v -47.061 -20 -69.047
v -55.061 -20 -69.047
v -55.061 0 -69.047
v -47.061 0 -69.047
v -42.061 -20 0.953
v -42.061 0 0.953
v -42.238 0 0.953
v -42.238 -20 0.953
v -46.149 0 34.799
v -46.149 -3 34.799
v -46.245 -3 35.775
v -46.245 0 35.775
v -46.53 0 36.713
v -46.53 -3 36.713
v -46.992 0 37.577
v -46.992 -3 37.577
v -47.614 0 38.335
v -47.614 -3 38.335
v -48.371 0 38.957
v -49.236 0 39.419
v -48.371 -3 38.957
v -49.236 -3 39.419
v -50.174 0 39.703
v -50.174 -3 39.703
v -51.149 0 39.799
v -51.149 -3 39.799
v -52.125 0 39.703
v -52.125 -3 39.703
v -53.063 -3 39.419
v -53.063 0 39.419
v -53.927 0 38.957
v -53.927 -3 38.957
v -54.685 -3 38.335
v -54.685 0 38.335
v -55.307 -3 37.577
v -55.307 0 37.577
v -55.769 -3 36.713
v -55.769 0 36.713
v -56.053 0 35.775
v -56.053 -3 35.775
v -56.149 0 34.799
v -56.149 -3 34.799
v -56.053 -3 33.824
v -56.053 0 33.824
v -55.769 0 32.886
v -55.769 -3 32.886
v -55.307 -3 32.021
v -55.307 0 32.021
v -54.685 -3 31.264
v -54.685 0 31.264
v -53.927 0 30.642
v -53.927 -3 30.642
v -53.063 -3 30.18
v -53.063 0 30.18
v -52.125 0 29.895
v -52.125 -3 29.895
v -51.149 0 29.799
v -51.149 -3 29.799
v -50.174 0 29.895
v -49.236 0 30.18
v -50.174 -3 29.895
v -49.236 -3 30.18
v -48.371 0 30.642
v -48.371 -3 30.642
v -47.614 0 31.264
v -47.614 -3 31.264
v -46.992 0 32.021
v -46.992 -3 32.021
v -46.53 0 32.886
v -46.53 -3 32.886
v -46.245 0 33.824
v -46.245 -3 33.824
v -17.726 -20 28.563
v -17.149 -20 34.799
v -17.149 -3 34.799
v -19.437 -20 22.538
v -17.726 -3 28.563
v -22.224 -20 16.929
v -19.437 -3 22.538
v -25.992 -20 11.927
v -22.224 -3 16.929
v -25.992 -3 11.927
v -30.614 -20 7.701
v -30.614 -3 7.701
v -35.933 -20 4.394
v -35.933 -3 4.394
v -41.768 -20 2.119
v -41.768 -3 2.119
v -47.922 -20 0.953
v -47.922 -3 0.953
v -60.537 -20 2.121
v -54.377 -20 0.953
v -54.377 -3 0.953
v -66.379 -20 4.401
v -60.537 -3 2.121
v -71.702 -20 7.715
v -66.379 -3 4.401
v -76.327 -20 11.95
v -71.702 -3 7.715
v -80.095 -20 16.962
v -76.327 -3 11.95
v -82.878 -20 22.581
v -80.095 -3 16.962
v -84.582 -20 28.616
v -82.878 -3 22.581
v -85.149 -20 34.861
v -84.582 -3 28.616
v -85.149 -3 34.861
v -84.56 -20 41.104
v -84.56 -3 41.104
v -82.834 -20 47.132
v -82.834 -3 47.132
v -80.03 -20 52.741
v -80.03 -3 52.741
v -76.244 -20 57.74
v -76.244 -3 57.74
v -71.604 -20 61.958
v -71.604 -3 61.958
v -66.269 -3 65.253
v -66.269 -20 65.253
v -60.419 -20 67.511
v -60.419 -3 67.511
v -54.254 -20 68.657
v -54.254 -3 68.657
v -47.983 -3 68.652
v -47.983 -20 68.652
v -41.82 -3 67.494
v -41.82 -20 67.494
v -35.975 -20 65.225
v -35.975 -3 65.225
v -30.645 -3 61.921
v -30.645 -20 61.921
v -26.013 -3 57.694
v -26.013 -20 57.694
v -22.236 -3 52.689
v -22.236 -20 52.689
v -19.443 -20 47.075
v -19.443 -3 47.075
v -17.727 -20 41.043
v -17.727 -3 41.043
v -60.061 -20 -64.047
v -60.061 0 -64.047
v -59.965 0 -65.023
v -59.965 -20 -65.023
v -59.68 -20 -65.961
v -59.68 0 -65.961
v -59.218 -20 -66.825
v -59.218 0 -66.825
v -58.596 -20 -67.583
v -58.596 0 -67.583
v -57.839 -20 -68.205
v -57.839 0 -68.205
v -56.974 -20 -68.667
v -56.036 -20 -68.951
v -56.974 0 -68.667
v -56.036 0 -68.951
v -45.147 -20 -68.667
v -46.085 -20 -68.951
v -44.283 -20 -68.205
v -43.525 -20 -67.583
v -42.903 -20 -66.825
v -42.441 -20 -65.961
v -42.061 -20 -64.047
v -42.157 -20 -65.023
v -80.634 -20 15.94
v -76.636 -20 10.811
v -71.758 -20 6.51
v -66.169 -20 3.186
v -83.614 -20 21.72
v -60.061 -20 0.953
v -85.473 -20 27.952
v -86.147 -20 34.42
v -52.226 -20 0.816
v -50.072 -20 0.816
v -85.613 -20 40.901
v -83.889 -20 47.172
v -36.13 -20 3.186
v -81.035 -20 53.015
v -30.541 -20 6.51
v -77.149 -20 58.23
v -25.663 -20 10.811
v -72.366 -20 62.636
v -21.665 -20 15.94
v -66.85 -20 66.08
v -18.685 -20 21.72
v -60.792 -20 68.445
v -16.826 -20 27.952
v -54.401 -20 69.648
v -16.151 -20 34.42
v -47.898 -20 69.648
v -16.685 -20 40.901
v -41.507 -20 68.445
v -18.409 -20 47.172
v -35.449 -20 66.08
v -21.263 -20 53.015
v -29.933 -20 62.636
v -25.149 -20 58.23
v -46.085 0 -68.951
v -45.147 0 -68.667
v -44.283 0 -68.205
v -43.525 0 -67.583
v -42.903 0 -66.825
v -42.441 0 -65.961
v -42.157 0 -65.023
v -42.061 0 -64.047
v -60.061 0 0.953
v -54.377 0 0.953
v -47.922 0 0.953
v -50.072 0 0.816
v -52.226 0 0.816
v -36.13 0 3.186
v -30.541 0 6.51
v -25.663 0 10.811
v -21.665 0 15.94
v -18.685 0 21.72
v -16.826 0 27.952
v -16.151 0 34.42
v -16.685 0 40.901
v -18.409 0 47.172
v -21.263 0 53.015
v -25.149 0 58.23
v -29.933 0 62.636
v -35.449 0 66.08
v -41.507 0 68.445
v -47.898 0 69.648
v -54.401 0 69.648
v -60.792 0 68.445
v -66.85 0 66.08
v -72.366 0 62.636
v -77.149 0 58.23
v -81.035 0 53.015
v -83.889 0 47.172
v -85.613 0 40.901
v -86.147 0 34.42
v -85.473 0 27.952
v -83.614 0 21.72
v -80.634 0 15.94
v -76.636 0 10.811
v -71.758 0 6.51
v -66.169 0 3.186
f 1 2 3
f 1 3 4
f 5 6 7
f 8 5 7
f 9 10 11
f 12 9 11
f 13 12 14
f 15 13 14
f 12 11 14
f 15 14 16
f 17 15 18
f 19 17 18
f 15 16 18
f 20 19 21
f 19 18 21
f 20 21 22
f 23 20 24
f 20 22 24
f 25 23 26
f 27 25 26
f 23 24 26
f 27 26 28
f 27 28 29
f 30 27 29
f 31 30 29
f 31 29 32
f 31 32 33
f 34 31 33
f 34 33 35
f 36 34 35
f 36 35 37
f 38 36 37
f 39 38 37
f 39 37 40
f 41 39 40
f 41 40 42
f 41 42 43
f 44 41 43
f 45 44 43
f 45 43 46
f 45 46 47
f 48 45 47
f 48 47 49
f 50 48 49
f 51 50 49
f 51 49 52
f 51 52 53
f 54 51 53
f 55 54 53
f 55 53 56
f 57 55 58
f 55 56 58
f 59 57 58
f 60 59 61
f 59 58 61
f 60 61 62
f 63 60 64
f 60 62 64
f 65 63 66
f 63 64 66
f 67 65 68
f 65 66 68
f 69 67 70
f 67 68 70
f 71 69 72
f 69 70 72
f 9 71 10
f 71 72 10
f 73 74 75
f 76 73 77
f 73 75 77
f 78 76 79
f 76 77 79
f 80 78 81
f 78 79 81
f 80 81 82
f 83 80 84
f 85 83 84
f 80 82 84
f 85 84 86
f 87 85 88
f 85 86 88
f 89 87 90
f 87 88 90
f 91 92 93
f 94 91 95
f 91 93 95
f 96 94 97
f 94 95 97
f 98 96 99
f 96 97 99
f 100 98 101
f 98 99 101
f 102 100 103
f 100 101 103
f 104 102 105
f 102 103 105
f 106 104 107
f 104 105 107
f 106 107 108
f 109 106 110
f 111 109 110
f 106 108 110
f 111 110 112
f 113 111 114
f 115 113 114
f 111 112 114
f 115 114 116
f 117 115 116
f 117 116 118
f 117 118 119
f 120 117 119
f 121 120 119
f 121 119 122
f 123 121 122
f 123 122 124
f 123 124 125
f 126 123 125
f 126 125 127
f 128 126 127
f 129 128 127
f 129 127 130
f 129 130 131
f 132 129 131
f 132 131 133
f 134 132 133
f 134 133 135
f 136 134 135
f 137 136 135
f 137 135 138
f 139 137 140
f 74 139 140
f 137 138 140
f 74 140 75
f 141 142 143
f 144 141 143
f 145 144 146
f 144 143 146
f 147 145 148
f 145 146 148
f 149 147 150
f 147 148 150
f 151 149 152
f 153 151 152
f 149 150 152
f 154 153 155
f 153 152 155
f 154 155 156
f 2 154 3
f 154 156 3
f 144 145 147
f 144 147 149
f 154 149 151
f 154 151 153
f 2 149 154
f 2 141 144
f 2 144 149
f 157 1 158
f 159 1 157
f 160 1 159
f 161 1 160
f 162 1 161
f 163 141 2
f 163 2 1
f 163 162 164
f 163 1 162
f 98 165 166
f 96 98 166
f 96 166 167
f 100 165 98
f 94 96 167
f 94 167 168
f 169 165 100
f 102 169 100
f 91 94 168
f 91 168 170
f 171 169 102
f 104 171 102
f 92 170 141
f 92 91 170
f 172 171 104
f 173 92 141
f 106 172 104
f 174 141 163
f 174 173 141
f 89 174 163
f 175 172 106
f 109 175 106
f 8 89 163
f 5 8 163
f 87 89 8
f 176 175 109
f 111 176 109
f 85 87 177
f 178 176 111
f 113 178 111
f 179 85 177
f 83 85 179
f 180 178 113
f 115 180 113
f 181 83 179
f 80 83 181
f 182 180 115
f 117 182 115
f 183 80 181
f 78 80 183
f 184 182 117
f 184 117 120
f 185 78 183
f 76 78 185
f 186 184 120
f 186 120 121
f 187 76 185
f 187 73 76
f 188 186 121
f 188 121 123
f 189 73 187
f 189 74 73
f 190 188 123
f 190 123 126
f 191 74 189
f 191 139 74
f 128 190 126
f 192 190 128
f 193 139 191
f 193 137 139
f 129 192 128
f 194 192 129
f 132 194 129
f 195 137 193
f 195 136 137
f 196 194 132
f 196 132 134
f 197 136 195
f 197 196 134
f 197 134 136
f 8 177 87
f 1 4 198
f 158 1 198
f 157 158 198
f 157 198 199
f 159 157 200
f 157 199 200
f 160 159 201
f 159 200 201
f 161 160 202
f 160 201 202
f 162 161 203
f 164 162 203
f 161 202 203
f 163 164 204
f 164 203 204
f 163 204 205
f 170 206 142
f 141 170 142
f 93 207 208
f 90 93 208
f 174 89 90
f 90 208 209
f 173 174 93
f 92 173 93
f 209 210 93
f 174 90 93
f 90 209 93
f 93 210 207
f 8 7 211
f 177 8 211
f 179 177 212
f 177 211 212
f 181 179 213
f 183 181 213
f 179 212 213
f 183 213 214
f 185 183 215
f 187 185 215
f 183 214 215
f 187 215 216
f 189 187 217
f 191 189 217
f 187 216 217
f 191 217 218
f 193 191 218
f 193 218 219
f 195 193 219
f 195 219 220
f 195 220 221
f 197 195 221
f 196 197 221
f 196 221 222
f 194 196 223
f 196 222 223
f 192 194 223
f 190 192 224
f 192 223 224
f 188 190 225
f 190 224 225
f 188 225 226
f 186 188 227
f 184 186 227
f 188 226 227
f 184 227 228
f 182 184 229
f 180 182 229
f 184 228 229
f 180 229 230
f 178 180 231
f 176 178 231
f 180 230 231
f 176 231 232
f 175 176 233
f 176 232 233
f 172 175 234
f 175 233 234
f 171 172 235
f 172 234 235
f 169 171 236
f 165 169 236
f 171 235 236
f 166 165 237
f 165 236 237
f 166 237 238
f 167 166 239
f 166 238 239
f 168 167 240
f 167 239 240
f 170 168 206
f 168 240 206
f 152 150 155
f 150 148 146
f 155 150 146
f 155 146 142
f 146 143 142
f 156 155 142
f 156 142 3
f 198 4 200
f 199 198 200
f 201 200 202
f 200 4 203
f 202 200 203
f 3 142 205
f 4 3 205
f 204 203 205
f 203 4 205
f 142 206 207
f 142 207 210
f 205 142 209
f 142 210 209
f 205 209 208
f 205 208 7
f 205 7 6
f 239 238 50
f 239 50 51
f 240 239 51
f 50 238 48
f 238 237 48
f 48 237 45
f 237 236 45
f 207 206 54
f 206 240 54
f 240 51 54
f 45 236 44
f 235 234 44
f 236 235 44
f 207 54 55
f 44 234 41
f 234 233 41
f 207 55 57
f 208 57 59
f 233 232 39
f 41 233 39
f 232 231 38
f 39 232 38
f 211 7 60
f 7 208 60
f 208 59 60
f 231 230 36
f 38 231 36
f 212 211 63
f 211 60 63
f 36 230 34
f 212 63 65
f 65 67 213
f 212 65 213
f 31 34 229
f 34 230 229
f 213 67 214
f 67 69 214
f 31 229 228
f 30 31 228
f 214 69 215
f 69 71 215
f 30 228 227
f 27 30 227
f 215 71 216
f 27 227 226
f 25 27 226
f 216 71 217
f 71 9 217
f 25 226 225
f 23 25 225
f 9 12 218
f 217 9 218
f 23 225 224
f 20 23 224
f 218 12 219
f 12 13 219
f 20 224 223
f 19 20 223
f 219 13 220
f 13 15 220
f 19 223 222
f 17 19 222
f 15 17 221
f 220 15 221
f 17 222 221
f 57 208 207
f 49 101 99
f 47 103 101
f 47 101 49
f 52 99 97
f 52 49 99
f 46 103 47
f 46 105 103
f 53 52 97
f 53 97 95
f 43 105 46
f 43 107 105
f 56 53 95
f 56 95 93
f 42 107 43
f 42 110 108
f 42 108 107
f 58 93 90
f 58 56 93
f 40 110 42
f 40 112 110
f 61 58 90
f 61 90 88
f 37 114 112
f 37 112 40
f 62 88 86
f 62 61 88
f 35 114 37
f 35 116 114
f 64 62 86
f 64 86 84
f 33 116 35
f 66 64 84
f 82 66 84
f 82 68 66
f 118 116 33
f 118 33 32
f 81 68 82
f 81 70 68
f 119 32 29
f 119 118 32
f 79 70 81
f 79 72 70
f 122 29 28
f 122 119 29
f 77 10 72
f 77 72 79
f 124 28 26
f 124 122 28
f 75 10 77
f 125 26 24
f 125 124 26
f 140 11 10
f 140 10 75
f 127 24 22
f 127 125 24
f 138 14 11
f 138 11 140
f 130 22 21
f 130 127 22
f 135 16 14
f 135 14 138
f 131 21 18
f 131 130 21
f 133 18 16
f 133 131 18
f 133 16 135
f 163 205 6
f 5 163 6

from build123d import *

# Parameters (mm, degrees)
F1_DEPTH = 20
F2_DEPTH = 20
F3_DEPTH = 3
F4_R     = 5
F5_DEPTH = 100


with BuildPart() as f1:
    # F0 (on Front) → F1 (new body)
    with BuildSketch(Plane.XZ):
        with BuildLine():
            ThreePointArc((-42.2376775657, 0.9527799487), (-23.4282681394, 13.4322820603), (-16.1492416263, 34.7992572542))
            ThreePointArc((-16.1492416263, 34.7992572542), (-72.5162168202, 62.5202307411), (-60.0608056868, 0.9527799487))
            Line((-60.0608056868, 0.9527799487), (-54.3766204398, 0.9527799487))
            ThreePointArc((-54.3766204398, 0.9527799487), (-74.0213766418, 59.9560742196), (-17.1492416263, 34.7992572542))
            ThreePointArc((-17.1492416263, 34.7992572542), (-25.9924246609, 11.9271222387), (-47.9218628128, 0.9527799487))
            Line((-47.9218628128, 0.9527799487), (-42.2376775657, 0.9527799487))
        make_face()
    extrude(amount=F1_DEPTH)

    # F0 (on Front) → F2 (join)
    with BuildSketch(Plane.XZ):
        with BuildLine():
            ThreePointArc((-42.2376775657, 0.9527799487), (-51.1492416263, -0.2007427458), (-60.0608056868, 0.9527799487))
            Line((-60.0608056868, 0.9527799487), (-60.0608056868, -64.0472200513))
            ThreePointArc((-60.0608056868, -64.0472200513), (-58.5963395928, -67.5827539572), (-55.0608056868, -69.0472200513))
            Line((-55.0608056868, -69.0472200513), (-47.0608056868, -69.0472200513))
            ThreePointArc((-47.0608056868, -69.0472200513), (-43.5252717809, -67.5827539572), (-42.0608056868, -64.0472200513))
            Line((-42.0608056868, -64.0472200513), (-42.0608056868, 0.9527799487))
            Line((-42.0608056868, 0.9527799487), (-42.2376775657, 0.9527799487))
        make_face()
        with BuildLine():
            Line((-54.3766204398, 0.9527799487), (-60.0608056868, 0.9527799487))
            ThreePointArc((-60.0608056868, 0.9527799487), (-51.1492416263, -0.2007427458), (-42.2376775657, 0.9527799487))
            Line((-42.2376775657, 0.9527799487), (-47.9218628128, 0.9527799487))
            ThreePointArc((-47.9218628128, 0.9527799487), (-51.1492416263, 0.7992572542), (-54.3766204398, 0.9527799487))
        make_face()
    extrude(amount=F2_DEPTH)

    # F0 (on Front) → F3 (join)
    with BuildSketch(Plane.XZ):
        with BuildLine():
            ThreePointArc((-17.1492416263, 34.7992572542), (-74.0213766418, 59.9560742196), (-54.3766204398, 0.9527799487))
            Line((-54.3766204398, 0.9527799487), (-47.9218628128, 0.9527799487))
            ThreePointArc((-47.9218628128, 0.9527799487), (-25.9924246609, 11.9271222387), (-17.1492416263, 34.7992572542))
        make_face()
    extrude(amount=F3_DEPTH)

    # F4 (on face) → F5 (cut)
    with BuildSketch(Plane.XZ.offset(3)):
        with Locations((-51.1492416263, 34.7992572542)):
            Circle(F4_R)
    extrude(amount=-F5_DEPTH, mode=Mode.SUBTRACT)


solid = f1.part
